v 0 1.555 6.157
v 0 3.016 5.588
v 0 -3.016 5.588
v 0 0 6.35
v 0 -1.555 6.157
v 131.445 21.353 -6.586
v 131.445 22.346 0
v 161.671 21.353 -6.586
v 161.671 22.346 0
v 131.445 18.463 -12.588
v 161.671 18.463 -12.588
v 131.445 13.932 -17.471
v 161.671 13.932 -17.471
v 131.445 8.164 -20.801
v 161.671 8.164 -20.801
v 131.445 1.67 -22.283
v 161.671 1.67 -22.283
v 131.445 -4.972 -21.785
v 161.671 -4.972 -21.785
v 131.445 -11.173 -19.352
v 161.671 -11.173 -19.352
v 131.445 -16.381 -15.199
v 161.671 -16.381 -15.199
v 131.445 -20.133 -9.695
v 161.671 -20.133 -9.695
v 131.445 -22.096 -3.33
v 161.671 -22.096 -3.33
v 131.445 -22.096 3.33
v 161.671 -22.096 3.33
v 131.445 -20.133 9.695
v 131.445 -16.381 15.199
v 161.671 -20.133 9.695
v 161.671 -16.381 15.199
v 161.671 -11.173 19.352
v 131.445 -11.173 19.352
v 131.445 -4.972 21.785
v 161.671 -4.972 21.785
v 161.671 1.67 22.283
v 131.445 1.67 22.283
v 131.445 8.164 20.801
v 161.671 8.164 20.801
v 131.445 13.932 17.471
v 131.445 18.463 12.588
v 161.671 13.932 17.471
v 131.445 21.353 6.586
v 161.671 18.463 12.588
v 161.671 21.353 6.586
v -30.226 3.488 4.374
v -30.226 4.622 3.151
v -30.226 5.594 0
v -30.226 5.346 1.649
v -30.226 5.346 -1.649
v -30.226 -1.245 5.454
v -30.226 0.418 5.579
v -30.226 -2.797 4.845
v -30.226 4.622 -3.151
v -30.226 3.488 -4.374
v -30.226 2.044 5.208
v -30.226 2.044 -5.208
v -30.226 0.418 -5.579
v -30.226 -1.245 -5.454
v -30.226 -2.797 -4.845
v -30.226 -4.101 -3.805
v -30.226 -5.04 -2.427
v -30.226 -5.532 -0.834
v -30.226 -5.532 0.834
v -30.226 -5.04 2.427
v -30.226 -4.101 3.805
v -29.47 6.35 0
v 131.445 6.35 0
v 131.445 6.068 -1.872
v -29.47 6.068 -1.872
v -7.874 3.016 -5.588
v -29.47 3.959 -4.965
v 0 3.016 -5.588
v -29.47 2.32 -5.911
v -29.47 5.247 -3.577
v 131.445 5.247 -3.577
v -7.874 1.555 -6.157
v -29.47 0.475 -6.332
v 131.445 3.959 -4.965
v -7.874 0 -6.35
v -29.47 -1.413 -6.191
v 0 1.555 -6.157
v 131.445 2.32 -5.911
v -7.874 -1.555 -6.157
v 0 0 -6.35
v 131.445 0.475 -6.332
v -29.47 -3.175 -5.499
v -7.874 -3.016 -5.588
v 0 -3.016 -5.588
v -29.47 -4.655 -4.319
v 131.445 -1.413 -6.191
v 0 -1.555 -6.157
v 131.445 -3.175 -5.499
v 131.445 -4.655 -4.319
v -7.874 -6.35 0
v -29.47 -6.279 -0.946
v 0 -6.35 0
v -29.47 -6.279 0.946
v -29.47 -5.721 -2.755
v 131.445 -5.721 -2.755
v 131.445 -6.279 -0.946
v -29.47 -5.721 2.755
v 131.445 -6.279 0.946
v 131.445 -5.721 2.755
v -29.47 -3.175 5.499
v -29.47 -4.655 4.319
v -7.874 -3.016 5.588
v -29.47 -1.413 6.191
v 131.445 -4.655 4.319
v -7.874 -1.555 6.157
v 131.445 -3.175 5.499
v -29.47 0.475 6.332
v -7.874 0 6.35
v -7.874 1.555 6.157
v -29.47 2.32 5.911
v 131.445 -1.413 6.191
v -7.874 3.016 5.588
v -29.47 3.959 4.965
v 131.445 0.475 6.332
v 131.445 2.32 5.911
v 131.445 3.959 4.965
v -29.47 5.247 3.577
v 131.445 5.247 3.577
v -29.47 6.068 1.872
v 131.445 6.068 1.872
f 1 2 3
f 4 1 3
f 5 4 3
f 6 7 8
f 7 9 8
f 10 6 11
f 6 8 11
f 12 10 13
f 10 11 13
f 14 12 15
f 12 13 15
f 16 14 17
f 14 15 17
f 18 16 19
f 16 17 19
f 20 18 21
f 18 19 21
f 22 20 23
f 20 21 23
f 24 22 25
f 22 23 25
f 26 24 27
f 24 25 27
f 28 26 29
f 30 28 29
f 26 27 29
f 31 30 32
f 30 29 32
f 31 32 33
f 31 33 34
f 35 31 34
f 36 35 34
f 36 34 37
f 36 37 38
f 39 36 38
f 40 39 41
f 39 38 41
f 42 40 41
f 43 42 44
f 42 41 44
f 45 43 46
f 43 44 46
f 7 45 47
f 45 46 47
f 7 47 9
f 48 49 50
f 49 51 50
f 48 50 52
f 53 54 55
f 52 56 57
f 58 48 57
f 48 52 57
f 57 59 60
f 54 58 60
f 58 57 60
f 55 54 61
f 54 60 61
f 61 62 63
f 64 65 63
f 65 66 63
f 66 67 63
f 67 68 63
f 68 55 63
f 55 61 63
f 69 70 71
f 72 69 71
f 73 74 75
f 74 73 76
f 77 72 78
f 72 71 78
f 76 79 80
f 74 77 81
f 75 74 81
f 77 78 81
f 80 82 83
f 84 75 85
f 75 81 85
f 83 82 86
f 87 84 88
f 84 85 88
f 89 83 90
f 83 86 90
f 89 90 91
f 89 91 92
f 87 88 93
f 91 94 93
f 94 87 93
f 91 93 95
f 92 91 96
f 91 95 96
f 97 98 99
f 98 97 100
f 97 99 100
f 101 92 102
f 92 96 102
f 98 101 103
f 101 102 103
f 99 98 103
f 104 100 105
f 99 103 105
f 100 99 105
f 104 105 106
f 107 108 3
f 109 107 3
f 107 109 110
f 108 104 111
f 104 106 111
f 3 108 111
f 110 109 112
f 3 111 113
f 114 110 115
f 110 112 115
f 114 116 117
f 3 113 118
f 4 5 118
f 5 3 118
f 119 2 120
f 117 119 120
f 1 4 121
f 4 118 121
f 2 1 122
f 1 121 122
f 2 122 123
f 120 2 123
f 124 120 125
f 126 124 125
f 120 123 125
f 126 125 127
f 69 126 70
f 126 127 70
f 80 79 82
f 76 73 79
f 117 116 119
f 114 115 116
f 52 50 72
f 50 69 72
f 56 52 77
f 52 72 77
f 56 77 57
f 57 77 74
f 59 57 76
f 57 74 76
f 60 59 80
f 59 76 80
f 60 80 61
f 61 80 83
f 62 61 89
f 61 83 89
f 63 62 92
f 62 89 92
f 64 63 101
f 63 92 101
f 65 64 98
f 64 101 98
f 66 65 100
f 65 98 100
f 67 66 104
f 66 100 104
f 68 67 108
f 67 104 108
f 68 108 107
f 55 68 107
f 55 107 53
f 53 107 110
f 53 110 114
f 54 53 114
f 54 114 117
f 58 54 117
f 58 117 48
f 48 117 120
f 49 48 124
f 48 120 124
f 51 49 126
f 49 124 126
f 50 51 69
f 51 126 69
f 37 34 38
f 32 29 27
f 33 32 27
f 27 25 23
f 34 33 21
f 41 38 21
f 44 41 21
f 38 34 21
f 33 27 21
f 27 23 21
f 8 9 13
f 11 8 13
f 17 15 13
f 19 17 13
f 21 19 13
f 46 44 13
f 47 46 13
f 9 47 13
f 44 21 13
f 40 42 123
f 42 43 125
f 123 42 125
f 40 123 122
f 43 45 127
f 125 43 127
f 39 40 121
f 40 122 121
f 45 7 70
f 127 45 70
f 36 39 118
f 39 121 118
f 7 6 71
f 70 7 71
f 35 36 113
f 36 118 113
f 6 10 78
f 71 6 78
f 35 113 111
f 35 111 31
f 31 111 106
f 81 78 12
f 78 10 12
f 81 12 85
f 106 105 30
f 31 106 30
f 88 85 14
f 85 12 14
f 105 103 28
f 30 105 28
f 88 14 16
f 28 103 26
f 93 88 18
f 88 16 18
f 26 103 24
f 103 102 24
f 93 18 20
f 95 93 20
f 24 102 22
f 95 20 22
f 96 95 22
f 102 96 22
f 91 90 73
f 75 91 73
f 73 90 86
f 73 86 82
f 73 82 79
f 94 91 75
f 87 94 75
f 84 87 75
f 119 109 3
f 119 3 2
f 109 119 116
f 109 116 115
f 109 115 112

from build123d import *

# Parameters (mm, degrees)
SKETCH3_W          = 25.4
SKETCH3_H          = 25.4
SKETCH3_W_2        = 11.176
SKETCH3_H_2        = 12.7
CUT_EXTRUDE1_DEPTH = 7.874


with BuildPart() as part:
    # Sketch1 → Revolve1 (revolve)
    with BuildSketch(Plane.XY):
        Polygon((-7.874, 0), (-7.874, 6.35), (131.445, 6.35), (131.445, 22.34565), (161.671, 22.34565), (161.671, 0), align=None)
    revolve(axis=Axis((161.671, 0, 0), (-1, 0, 0)))

    # Sketch2 → Revolve2 (revolve)
    with BuildSketch(Plane.XY):
        Polygon((-30.226, 0), (-30.226, 5.59435), (-29.47035, 6.35), (-7.874, 6.35), (-7.874, 0), align=None)
    revolve(axis=Axis((-7.874, 0, 0), (-1, 0, 0)))

    # Sketch3 → Cut-Extrude1 (cut)
    with BuildSketch(Plane(origin=(-7.874, 0, 0), x_dir=(0, 0, -1), z_dir=(1, 0, 0))):
        Rectangle(SKETCH3_W, SKETCH3_H)
        Rectangle(SKETCH3_W_2, SKETCH3_H_2, mode=Mode.SUBTRACT)
    extrude(amount=CUT_EXTRUDE1_DEPTH, mode=Mode.SUBTRACT)


solid = part.part
